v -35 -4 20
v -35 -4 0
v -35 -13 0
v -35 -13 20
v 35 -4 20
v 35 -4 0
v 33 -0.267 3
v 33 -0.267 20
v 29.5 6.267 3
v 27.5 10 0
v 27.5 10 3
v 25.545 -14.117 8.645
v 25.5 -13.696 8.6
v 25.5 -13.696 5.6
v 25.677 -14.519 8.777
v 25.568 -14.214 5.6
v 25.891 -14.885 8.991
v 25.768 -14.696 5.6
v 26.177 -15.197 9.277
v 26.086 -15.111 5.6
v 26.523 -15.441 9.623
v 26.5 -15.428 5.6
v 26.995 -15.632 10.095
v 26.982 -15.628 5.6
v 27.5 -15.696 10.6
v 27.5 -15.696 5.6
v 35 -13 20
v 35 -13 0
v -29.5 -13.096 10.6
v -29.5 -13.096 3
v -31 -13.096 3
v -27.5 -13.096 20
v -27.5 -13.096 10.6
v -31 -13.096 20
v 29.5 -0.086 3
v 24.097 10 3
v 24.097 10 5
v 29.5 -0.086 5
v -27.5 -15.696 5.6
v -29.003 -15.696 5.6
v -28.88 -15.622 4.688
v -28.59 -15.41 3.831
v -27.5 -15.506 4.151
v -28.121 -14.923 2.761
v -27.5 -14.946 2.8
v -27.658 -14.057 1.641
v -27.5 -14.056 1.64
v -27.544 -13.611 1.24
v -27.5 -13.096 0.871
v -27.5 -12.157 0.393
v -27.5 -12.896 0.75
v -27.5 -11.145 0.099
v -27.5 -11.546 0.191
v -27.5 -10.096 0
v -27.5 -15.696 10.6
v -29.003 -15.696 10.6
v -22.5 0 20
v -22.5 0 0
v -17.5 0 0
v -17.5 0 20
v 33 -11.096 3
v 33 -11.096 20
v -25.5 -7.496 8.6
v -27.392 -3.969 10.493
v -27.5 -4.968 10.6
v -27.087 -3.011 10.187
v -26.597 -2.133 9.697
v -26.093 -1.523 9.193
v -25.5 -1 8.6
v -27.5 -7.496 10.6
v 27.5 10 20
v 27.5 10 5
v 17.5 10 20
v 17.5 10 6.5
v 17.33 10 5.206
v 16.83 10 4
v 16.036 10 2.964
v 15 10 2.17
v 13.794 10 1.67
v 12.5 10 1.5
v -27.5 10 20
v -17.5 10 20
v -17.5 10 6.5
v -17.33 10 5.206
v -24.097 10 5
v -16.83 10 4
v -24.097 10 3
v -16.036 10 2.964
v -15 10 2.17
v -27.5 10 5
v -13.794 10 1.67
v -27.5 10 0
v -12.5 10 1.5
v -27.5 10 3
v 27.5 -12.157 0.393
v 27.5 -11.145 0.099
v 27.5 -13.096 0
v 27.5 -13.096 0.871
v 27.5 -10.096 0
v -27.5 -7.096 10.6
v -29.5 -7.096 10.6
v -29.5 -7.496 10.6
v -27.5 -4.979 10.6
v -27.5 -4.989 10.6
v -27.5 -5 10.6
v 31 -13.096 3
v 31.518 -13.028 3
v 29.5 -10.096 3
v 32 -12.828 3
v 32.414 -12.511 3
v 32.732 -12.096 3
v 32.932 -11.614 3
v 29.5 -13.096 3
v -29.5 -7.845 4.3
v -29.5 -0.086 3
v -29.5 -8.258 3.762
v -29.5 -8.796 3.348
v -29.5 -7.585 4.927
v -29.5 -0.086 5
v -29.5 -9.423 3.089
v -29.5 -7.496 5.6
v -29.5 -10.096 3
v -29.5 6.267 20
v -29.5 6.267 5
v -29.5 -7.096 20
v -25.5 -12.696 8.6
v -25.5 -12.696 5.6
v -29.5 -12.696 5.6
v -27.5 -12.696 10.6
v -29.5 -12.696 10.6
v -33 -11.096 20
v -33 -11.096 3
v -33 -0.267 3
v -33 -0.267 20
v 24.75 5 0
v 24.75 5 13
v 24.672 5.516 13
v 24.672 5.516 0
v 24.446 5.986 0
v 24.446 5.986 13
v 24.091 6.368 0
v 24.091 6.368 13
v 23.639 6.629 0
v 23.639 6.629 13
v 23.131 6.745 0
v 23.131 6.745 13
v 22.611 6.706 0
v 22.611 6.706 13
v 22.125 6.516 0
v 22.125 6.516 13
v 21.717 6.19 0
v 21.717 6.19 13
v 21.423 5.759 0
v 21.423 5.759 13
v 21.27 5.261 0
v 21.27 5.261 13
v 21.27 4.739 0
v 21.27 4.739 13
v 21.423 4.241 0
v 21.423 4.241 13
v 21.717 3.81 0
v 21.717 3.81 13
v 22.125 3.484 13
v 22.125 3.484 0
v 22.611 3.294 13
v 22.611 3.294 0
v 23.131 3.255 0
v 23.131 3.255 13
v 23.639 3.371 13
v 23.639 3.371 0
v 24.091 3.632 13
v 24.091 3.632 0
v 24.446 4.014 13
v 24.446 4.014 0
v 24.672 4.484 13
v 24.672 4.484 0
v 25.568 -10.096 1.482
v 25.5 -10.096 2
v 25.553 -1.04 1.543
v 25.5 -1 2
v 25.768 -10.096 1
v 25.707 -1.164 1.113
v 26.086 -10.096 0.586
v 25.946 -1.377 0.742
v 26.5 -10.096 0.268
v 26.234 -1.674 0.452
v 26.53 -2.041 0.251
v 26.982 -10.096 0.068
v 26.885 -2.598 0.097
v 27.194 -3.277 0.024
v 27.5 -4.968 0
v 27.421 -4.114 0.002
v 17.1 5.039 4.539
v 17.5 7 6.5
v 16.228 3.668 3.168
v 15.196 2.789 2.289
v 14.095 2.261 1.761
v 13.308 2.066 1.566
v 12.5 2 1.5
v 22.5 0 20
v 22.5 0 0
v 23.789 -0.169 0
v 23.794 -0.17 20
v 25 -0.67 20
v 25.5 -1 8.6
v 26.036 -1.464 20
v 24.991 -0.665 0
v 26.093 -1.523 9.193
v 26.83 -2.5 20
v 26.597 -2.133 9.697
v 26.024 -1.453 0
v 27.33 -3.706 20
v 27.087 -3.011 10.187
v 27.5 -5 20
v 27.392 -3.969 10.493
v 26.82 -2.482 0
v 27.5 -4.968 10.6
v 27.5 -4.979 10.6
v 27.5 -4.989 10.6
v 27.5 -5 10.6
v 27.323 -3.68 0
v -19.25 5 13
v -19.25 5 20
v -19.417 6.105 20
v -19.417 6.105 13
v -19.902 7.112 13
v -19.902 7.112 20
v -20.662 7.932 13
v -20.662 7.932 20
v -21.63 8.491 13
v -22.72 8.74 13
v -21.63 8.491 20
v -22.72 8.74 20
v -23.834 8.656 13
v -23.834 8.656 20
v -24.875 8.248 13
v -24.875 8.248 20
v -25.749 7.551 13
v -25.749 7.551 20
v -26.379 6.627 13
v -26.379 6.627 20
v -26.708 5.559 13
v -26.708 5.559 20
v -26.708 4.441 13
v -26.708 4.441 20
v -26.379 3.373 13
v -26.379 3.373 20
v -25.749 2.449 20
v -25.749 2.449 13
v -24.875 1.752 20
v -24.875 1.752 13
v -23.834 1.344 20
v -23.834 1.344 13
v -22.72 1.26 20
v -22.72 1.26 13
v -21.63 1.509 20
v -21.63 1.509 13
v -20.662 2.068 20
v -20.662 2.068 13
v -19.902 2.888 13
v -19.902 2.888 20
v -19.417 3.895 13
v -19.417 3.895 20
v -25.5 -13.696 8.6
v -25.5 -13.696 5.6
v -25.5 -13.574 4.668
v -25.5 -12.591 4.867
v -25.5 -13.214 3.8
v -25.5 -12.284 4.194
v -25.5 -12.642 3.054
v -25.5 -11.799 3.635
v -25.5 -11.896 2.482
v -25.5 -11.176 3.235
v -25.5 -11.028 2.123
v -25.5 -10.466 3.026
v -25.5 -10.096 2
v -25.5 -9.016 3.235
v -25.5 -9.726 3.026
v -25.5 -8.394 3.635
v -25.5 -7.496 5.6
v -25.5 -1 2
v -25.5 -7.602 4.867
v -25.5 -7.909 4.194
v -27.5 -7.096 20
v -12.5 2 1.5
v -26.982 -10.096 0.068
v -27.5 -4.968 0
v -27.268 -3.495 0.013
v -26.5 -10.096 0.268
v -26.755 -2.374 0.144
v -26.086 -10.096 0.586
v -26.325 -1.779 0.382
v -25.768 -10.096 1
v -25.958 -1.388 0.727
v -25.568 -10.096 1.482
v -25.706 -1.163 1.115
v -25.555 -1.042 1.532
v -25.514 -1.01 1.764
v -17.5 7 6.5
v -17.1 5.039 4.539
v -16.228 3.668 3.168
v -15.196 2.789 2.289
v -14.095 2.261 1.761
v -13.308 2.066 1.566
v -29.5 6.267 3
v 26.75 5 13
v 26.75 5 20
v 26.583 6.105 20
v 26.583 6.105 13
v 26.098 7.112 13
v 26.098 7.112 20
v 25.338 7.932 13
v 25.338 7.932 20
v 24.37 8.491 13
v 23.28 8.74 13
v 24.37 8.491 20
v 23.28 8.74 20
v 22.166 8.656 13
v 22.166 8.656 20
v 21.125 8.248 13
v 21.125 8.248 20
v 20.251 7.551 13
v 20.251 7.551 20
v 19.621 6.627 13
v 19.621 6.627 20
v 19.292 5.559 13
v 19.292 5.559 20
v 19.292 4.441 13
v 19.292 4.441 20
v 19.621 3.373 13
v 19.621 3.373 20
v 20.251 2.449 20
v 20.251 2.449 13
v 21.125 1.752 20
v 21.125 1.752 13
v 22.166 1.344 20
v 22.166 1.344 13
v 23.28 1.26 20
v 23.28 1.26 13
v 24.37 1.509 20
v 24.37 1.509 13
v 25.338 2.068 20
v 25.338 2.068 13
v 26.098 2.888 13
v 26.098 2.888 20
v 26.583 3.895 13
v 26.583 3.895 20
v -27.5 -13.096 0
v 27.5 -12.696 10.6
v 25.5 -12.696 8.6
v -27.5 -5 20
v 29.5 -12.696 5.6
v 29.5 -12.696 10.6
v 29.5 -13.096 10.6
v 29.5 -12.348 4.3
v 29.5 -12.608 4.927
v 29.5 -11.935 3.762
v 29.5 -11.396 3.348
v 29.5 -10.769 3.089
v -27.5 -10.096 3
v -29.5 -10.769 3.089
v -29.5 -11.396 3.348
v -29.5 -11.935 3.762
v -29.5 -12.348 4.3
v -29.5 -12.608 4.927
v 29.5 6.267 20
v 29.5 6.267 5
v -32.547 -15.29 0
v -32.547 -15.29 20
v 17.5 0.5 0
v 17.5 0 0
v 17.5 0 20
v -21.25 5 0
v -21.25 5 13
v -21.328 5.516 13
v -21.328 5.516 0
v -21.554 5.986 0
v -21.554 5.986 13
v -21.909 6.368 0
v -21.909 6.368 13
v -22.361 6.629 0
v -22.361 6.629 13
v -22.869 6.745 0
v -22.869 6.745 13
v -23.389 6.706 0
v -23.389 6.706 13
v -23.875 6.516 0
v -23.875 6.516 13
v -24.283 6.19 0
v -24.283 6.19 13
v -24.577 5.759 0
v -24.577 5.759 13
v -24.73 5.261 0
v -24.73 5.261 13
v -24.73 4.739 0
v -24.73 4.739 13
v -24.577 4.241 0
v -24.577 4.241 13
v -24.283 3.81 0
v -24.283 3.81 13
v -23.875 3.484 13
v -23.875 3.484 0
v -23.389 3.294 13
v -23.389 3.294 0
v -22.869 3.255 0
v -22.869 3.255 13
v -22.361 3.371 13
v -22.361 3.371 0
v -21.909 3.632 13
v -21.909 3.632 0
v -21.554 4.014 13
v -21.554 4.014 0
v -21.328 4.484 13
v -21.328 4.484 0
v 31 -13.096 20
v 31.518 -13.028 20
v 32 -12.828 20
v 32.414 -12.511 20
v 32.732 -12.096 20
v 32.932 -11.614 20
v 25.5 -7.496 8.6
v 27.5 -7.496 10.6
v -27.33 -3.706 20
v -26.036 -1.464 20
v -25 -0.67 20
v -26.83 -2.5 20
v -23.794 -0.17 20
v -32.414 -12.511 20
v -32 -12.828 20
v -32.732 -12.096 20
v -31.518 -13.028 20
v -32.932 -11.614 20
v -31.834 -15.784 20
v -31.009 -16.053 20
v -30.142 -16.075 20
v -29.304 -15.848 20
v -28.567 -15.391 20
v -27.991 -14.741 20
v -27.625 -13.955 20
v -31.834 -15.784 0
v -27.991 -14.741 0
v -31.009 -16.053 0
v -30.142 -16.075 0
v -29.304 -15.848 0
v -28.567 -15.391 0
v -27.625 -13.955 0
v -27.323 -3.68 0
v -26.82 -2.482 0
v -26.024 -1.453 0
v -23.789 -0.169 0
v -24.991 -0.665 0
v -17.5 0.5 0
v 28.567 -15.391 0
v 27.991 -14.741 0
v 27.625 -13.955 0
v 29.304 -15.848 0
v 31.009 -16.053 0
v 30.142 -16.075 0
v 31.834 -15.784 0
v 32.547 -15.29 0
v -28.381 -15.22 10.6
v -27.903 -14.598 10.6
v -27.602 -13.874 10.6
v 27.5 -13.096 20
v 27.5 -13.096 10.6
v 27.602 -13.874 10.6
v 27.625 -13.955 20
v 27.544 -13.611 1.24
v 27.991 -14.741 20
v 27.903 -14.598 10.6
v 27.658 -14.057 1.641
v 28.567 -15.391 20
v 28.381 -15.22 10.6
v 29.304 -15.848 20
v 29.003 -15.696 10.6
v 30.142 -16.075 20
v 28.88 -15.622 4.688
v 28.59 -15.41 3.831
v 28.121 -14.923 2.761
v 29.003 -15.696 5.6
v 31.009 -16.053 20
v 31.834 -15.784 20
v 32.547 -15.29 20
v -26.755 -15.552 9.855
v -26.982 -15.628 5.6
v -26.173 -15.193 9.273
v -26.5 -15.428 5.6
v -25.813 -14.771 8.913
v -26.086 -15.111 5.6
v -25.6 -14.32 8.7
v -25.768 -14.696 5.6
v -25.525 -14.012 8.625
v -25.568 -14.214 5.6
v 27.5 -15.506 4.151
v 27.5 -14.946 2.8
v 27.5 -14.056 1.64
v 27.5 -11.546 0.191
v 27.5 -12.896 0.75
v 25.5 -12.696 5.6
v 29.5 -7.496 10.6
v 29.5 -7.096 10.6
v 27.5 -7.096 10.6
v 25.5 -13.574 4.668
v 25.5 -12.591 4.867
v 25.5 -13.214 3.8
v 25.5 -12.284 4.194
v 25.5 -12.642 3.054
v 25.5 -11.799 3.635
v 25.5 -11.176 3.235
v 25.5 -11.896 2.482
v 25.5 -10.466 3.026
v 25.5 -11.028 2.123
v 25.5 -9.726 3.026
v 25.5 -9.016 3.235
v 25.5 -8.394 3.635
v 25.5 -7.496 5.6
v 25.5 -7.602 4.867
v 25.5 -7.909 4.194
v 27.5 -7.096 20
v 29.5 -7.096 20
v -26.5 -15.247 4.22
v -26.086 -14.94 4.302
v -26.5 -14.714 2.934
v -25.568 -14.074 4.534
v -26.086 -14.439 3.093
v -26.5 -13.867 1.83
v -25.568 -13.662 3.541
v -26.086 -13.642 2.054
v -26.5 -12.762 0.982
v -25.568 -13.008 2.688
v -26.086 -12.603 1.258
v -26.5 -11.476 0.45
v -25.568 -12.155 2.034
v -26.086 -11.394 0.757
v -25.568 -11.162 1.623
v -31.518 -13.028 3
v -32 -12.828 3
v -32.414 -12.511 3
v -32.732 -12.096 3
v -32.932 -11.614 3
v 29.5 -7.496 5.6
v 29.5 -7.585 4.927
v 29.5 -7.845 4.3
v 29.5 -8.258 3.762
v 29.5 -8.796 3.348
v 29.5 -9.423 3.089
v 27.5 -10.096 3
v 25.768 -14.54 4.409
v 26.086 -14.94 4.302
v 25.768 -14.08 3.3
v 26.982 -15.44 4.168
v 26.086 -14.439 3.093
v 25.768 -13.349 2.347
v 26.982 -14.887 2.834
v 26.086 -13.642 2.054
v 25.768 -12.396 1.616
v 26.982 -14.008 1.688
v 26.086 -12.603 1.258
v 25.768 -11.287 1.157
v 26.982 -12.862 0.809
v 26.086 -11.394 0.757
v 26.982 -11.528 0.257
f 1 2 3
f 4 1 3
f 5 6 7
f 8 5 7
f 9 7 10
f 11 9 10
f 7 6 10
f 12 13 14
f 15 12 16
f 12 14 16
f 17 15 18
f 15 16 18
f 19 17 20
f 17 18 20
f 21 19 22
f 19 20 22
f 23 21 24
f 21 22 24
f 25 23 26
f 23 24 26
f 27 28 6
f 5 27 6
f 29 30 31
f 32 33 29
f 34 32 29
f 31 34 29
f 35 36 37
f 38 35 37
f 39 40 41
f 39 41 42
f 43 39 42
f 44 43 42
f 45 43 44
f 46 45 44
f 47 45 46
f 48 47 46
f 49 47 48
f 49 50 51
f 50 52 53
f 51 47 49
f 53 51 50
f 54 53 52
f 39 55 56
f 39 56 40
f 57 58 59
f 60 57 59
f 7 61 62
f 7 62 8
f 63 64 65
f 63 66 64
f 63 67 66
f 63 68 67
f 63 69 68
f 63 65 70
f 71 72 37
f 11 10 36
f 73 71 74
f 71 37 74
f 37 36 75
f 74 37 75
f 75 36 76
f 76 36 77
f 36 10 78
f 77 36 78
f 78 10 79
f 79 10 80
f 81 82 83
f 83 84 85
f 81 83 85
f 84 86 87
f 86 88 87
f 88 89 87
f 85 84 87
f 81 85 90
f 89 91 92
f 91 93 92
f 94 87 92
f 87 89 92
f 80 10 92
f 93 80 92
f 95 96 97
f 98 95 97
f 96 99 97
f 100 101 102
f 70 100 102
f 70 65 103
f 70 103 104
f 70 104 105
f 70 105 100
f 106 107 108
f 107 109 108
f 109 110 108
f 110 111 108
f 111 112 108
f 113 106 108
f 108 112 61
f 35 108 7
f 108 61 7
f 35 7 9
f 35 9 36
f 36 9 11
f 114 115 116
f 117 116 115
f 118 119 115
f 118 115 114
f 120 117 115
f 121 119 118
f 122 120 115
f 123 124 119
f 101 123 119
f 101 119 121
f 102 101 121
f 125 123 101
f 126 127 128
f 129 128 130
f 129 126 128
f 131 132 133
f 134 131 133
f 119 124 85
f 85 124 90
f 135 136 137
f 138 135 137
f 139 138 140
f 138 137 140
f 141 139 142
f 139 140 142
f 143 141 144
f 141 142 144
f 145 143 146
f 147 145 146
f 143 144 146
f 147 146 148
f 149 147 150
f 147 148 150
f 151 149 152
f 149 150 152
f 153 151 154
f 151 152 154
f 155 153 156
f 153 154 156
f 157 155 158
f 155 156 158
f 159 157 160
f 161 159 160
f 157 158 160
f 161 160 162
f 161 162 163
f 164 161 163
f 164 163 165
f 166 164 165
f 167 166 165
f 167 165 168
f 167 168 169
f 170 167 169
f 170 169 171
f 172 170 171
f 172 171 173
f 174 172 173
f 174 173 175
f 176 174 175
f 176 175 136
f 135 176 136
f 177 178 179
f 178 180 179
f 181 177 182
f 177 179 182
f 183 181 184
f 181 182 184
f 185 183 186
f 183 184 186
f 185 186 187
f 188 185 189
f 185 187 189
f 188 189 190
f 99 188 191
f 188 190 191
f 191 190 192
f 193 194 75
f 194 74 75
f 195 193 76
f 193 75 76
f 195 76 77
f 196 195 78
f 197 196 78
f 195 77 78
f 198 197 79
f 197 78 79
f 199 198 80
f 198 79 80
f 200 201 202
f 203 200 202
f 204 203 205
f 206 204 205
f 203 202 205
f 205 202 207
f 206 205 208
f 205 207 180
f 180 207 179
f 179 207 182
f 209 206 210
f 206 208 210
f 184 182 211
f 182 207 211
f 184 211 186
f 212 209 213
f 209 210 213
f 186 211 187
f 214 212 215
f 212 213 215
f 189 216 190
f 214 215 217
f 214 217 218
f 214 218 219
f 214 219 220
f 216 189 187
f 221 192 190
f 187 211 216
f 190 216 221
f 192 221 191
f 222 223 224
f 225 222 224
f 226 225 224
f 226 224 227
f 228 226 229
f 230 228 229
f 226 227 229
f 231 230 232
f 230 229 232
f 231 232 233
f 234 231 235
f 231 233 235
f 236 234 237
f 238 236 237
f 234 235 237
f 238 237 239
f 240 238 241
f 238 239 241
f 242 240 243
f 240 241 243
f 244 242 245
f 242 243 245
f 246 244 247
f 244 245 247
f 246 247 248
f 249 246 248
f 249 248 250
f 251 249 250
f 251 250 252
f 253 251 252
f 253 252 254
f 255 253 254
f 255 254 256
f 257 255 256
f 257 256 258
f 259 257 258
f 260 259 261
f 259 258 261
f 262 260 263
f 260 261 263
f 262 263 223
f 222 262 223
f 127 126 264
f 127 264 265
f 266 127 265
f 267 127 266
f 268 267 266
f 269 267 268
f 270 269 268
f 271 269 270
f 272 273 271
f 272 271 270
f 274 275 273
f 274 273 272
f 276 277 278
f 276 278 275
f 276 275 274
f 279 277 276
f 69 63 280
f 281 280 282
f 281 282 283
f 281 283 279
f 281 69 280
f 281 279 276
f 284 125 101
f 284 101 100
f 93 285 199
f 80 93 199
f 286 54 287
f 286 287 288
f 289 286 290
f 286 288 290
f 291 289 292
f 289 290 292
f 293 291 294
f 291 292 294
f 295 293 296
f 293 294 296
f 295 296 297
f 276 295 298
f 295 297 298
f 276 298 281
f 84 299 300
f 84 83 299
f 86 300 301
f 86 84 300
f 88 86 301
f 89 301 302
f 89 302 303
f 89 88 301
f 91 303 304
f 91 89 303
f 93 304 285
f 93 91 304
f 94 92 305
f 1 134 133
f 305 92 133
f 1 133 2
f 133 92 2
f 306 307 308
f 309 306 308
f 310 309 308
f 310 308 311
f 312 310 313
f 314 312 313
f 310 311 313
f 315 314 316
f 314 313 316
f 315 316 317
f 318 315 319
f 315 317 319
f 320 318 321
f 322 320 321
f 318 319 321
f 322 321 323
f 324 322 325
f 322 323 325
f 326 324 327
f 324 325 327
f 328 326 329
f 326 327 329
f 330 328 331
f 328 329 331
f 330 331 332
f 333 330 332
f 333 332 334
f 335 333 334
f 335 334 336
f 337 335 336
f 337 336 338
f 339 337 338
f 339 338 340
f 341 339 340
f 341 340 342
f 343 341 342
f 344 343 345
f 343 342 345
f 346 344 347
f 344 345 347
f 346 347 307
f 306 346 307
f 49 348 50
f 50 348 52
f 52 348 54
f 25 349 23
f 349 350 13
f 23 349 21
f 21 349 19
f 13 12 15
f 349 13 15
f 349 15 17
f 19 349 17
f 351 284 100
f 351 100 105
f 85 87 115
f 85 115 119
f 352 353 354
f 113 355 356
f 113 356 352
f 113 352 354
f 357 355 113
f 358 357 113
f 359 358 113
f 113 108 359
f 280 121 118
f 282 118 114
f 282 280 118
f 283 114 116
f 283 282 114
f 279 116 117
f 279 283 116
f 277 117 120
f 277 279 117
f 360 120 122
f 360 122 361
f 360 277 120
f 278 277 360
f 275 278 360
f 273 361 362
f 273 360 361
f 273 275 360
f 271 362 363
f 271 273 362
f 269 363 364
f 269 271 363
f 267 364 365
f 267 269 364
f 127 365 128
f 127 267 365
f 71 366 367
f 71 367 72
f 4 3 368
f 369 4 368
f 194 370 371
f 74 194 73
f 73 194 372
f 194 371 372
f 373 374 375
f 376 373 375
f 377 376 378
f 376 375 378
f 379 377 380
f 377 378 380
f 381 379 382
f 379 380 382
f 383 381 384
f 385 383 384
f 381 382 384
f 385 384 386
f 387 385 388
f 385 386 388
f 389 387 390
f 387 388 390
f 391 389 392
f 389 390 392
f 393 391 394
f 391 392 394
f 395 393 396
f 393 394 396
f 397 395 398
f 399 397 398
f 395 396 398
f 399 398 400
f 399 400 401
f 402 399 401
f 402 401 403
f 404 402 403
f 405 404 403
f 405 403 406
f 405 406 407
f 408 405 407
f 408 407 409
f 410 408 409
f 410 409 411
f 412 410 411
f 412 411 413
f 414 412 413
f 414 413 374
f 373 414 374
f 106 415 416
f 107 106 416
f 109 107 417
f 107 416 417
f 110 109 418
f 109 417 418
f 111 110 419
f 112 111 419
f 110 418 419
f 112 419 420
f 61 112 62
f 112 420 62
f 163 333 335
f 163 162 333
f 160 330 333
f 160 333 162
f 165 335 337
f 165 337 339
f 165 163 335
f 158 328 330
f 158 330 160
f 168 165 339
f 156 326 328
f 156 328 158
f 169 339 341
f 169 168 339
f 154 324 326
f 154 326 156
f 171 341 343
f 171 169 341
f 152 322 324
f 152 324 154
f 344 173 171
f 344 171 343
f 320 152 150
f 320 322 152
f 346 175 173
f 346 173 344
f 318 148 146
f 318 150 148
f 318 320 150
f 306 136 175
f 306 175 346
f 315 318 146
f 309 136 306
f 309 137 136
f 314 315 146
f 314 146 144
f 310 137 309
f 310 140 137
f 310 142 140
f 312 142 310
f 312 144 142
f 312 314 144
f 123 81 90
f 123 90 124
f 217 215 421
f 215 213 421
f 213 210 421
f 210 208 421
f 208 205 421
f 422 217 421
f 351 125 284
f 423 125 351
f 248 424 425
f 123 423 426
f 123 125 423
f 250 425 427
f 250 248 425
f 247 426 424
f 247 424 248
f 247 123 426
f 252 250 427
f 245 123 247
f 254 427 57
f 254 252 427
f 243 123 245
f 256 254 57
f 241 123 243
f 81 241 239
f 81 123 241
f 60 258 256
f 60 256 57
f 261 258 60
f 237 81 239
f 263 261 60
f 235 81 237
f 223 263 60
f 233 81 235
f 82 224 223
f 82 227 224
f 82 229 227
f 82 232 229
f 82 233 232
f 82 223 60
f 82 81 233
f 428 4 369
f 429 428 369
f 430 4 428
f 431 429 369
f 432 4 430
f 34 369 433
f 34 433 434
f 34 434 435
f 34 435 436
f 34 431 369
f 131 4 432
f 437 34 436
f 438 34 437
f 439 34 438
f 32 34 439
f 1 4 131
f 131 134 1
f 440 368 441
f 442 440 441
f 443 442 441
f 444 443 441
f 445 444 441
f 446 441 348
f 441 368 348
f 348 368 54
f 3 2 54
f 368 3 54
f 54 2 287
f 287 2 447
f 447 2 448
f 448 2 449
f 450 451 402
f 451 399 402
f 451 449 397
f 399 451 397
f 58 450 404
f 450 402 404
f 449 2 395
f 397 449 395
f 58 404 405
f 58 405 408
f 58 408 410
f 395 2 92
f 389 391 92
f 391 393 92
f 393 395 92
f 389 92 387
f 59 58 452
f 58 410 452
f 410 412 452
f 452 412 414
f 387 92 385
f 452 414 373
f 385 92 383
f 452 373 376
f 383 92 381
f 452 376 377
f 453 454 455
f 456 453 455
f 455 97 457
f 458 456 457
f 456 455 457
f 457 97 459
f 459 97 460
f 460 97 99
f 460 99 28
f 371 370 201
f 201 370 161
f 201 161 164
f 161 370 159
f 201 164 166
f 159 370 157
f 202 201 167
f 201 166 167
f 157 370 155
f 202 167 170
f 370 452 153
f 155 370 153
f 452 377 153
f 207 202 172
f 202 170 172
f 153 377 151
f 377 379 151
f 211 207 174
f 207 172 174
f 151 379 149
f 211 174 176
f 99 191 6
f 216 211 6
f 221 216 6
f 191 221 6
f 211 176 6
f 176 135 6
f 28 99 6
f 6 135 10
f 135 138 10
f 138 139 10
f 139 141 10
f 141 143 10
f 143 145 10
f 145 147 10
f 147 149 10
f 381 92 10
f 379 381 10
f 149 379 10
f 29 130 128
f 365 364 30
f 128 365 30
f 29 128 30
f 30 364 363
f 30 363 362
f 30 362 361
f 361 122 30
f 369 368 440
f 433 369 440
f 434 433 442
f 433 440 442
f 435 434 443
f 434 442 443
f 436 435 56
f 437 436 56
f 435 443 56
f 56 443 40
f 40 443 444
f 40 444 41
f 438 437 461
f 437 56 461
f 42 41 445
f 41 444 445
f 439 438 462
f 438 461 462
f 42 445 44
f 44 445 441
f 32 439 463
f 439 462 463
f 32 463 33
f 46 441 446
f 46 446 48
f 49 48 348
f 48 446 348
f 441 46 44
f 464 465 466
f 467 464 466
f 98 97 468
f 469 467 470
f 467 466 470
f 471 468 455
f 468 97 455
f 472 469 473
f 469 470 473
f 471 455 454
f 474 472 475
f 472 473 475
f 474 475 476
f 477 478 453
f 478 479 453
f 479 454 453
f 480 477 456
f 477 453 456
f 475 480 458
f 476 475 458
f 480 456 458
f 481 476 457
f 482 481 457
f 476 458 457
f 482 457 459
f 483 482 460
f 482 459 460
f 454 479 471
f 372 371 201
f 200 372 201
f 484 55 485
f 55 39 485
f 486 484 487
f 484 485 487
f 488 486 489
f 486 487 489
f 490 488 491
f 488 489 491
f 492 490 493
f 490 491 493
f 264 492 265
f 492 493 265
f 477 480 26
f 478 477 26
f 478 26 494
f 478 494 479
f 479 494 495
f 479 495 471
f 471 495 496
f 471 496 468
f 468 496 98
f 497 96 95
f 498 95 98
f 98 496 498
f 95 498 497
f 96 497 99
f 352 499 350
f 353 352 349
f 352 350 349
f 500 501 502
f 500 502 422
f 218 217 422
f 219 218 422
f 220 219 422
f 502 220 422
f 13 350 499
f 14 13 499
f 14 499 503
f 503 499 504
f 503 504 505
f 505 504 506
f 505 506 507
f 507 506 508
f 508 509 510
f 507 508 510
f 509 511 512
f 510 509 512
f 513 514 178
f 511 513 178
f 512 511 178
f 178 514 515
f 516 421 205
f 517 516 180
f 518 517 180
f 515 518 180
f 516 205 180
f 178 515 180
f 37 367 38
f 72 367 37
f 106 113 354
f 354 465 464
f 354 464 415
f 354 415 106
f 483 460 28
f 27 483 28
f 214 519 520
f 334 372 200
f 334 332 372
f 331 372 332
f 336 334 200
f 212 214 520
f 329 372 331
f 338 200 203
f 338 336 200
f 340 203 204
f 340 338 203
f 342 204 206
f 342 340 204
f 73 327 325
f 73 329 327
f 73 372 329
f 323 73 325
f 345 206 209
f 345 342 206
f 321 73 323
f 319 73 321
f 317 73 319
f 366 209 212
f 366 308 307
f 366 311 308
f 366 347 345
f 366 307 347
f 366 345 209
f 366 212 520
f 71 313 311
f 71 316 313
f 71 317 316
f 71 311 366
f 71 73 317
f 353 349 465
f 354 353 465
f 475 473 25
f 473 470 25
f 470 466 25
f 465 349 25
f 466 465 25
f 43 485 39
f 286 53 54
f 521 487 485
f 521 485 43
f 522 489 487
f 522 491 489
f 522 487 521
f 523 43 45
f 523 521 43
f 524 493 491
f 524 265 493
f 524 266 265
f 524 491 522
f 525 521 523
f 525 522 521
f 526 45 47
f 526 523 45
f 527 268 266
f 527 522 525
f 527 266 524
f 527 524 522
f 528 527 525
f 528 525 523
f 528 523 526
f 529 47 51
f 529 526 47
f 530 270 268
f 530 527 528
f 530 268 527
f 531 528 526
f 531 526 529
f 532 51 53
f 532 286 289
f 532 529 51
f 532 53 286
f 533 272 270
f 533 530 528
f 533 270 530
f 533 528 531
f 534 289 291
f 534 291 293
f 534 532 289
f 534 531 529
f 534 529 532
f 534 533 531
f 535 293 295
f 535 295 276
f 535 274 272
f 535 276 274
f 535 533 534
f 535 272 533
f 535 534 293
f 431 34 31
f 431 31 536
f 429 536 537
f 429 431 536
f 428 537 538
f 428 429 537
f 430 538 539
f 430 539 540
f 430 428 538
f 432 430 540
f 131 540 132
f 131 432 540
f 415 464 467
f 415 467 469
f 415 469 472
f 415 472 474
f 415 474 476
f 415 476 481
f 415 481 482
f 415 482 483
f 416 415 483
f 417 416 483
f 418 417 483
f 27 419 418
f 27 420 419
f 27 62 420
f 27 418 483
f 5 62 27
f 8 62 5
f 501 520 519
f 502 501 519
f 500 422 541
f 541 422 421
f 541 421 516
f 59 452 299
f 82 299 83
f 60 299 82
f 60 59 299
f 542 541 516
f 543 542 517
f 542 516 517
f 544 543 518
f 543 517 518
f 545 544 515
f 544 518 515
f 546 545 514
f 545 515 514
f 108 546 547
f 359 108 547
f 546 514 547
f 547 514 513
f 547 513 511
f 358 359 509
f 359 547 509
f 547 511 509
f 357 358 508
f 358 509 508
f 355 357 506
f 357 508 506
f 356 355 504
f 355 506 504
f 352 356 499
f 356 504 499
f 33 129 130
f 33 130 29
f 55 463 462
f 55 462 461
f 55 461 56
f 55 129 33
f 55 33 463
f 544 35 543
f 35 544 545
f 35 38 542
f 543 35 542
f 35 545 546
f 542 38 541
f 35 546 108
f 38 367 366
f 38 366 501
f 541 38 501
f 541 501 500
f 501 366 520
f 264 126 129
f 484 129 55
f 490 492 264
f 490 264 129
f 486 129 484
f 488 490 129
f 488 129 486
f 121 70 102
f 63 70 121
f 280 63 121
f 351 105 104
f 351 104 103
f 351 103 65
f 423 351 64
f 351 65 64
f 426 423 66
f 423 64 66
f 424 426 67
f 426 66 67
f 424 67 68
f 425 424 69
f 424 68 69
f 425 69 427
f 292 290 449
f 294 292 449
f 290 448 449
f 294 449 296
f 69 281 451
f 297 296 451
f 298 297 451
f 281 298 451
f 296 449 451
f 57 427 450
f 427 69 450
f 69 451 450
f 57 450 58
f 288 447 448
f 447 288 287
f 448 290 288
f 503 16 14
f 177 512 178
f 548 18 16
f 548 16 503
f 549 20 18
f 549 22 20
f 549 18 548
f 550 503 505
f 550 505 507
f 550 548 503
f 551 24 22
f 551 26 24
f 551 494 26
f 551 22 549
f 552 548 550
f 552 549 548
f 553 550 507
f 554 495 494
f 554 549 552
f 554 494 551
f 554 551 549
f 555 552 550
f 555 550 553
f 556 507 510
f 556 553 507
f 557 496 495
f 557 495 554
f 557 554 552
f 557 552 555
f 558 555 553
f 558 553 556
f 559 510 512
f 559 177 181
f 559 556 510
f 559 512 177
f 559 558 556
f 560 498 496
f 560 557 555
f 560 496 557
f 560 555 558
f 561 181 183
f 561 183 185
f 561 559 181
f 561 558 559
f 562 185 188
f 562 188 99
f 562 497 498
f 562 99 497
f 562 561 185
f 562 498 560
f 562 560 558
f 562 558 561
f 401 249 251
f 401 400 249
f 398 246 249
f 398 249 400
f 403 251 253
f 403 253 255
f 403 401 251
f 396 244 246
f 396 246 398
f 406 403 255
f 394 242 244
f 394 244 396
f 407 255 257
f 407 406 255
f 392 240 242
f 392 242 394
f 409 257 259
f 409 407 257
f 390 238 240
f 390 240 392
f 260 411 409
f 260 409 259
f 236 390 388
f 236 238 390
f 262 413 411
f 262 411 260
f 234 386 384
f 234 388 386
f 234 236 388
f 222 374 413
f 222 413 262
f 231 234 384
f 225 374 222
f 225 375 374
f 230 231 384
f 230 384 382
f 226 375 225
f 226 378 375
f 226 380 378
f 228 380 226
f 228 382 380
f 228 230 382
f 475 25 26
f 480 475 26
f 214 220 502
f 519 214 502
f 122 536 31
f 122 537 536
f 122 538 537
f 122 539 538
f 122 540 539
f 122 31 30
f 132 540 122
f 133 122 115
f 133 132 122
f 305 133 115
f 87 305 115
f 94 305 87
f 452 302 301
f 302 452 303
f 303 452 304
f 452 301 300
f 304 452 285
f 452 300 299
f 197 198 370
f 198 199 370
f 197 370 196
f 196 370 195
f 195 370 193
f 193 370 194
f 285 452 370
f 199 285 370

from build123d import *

# Parameters (mm, degrees)
BOSS_EXTRUDE1_DEPTH = 20
SKETCH3_W           = 35
SKETCH3_H           = 18.5
CUT_EXTRUDE2_DEPTH  = 44.406131606
CUT_EXTRUDE1_DEPTH  = 17
SKETCH5_R           = 1.75
CUT_EXTRUDE4_DEPTH  = 44.406131606
SKETCH6_R           = 3.75
CUT_EXTRUDE5_DEPTH  = 7
CHAMFER1_SIZE       = 2
FILLET1_R           = 5
BOSS_EXTRUDE5_DEPTH = 2
CHAMFER2_SIZE       = 2
FILLET2_R           = 2
SKETCH8_W           = 2
SKETCH8_H           = 17.504208533
CUT_EXTRUDE6_DEPTH  = 3


# Some blends are built 0.0001 mm under size
with BuildPart() as part:
    # Sketch1 → Boss-Extrude1 (new body)
    with BuildSketch(Plane.XY):
        with BuildLine():
            Line((-22.5, 0), (22.5, 0))
            ThreePointArc((22.5, 0), (26.035533906, -1.464466094), (27.5, -5))
            Line((27.5, -5), (27.5, -13.096343094))
            ThreePointArc((27.5, -13.096343094), (29.304354621, -15.847784921), (32.546954751, -15.289508899))
            Line((32.546954751, -15.289508899), (35, -13))
            Line((35, -13), (35, -4))
            Line((35, -4), (27.5, 10))
            Line((27.5, 10), (-27.5, 10))
            Line((-27.5, 10), (-35, -4))
            Line((-35, -4), (-35, -13))
            Line((-35, -13), (-32.546954751, -15.289508899))
            ThreePointArc((-32.546954751, -15.289508899), (-29.304354621, -15.847784921), (-27.5, -13.096343094))
            Line((-27.5, -13.096343094), (-27.5, -5))
            ThreePointArc((-27.5, -5), (-26.035533906, -1.464466094), (-22.5, 0))
        make_face()
    extrude(amount=BOSS_EXTRUDE1_DEPTH)

    # Sketch3 → Cut-Extrude2 (cut, through all)
    with BuildSketch(Plane.XZ):
        with Locations((0, 10.75)):
            Rectangle(SKETCH3_W, SKETCH3_H)
    extrude(amount=-CUT_EXTRUDE2_DEPTH, mode=Mode.SUBTRACT)

    # Sketch2 → Cut-Extrude1 (cut)
    with BuildSketch(Plane.XY.offset(20)):
        with BuildLine():
            Line((-27.5, -13.096343094), (-30.529524623, -13.096343094))
            Line((-30.529524623, -13.096343094), (-31, -13.096343094))
            ThreePointArc((-31, -13.096343094), (-32.414213562, -12.510556657), (-33, -11.096343094))
            Line((-33, -11.096343094), (-33, 8.594773791))
            Line((-33, 8.594773791), (-29.5, 8.594773791))
            Line((-29.5, 8.594773791), (-29.5, -7.096343094))
            Line((-29.5, -7.096343094), (-27.5, -7.096343094))
            Line((-27.5, -7.096343094), (-27.5, -13.096343094))
        make_face()
    cut_extrude1 = extrude(amount=-CUT_EXTRUDE1_DEPTH, mode=Mode.SUBTRACT)

    # Mirror1: Cut-Extrude1 across plane
    add(cut_extrude1.mirror(Plane(origin=(0, 0, 0), x_dir=(0, 0, 1), z_dir=(1, 0, 0))), mode=Mode.SUBTRACT)

    # Sketch5 → Cut-Extrude4 (cut, through all)
    with BuildSketch(Plane.XY.offset(20)):
        with Locations((-23, 5)):
            Circle(SKETCH5_R)
        with Locations((23, 5)):
            Circle(SKETCH5_R)
    extrude(amount=-CUT_EXTRUDE4_DEPTH, mode=Mode.SUBTRACT)

    # Sketch6 → Cut-Extrude5 (cut)
    with BuildSketch(Plane.XY.offset(20)):
        with Locations((-23, 5)):
            Circle(SKETCH6_R)
        with Locations((23, 5)):
            Circle(SKETCH6_R)
    extrude(amount=-CUT_EXTRUDE5_DEPTH, mode=Mode.SUBTRACT)

    # Chamfer1
    # the kernel refuses this chamfer: 2 mm, written as the material it takes off along each edge
    with BuildSketch(Plane(origin=(17.5, 0, 1.5), x_dir=(0, -0.027495876610586365, -0.9996219169112968), z_dir=(-1, 0, 0))) as chamfer1_piece_1:
        Polygon((CHAMFER1_SIZE * 0.999621916911, -CHAMFER1_SIZE * 0.0274958766106), (-CHAMFER1_SIZE * 0.0274958766106, -CHAMFER1_SIZE * 0.999621916911), (0, 0), align=None)
    extrude(amount=35, mode=Mode.SUBTRACT)

    # Fillet1
    fillet1_edges = [part.edges().sort_by_distance(p)[0] for p in [
        (-17.5, 6, 1.5),
        (17.5, 6, 1.5),
    ]]
    fillet(fillet1_edges, radius=FILLET1_R)

    # Sketch7 → Boss-Extrude5 (add, symmetric)
    with BuildSketch(Plane(origin=(-27.5, 0, 0), x_dir=(0, 0, -1), z_dir=(1, 0, 0))):
        with BuildLine():
            Line((0, -10.096343094), (0, 0))
            Line((0, 0), (-10.6, 0))
            Line((-10.6, 0), (-10.6, -7.496343094))
            Line((-10.6, -7.496343094), (-5.6, -7.496343094))
            ThreePointArc((-5.6, -7.496343094), (-3, -10.096343094), (-5.6, -12.696343094))
            Line((-5.6, -12.696343094), (-10.6, -12.696343094))
            Line((-10.6, -12.696343094), (-10.6, -15.696343094))
            Line((-10.6, -15.696343094), (-5.6, -15.696343094))
            ThreePointArc((-5.6, -15.696343094), (-1.640202025, -14.056141069), (0, -10.096343094))
        make_face()
    boss_extrude5 = extrude(amount=BOSS_EXTRUDE5_DEPTH, both=True)

    # Mirror4: Boss-Extrude5 across plane
    add(boss_extrude5.mirror(Plane(origin=(0, 0, 0), x_dir=(0, 0, 1), z_dir=(1, 0, 0))))

    # Chamfer2
    chamfer2_edges = [part.edges().sort_by_distance(p)[0] for p in [
        (25.5, -14.196343094, 10.6),
        (25.5, -4.248171547, 10.6),
        (-25.5, -4.248171547, 10.6),
        (-25.5, -14.196343094, 10.6),
    ]]
    chamfer(chamfer2_edges, length=CHAMFER2_SIZE - 0.0001)  # a hair under: the kernel refuses the full size

    # Fillet2
    fillet2_edges = [part.edges().sort_by_distance(p)[0] for p in [
        (25.5, -5.548171547, 0),
        (25.5, -14.056141069, 1.640202025),
        (-25.5, -5.548171547, 0),
        (-25.5, -14.056141069, 1.640202025),
        (25.5, -15.696343094, 7.10005),
        (-25.5, -15.696343094, 7.10005),
    ]]
    fillet(fillet2_edges, radius=FILLET2_R - 0.0001)  # a hair under: the kernel refuses the full size

    # Sketch8 → Cut-Extrude6 (cut)
    with BuildSketch(Plane(origin=(-25.530227948, 13.67690783, 0), x_dir=(0, 0, 1), z_dir=(-0.8814799700287818, 0.4722214125154193, 0))):
        with Locations((4, -6.39655042)):
            Rectangle(SKETCH8_W, SKETCH8_H)
    cut_extrude6 = extrude(amount=-CUT_EXTRUDE6_DEPTH, mode=Mode.SUBTRACT)

    # Mirror5: Cut-Extrude6 across plane
    add(cut_extrude6.mirror(Plane(origin=(0, 0, 0), x_dir=(0, 0, 1), z_dir=(1, 0, 0))), mode=Mode.SUBTRACT)


solid = part.part
